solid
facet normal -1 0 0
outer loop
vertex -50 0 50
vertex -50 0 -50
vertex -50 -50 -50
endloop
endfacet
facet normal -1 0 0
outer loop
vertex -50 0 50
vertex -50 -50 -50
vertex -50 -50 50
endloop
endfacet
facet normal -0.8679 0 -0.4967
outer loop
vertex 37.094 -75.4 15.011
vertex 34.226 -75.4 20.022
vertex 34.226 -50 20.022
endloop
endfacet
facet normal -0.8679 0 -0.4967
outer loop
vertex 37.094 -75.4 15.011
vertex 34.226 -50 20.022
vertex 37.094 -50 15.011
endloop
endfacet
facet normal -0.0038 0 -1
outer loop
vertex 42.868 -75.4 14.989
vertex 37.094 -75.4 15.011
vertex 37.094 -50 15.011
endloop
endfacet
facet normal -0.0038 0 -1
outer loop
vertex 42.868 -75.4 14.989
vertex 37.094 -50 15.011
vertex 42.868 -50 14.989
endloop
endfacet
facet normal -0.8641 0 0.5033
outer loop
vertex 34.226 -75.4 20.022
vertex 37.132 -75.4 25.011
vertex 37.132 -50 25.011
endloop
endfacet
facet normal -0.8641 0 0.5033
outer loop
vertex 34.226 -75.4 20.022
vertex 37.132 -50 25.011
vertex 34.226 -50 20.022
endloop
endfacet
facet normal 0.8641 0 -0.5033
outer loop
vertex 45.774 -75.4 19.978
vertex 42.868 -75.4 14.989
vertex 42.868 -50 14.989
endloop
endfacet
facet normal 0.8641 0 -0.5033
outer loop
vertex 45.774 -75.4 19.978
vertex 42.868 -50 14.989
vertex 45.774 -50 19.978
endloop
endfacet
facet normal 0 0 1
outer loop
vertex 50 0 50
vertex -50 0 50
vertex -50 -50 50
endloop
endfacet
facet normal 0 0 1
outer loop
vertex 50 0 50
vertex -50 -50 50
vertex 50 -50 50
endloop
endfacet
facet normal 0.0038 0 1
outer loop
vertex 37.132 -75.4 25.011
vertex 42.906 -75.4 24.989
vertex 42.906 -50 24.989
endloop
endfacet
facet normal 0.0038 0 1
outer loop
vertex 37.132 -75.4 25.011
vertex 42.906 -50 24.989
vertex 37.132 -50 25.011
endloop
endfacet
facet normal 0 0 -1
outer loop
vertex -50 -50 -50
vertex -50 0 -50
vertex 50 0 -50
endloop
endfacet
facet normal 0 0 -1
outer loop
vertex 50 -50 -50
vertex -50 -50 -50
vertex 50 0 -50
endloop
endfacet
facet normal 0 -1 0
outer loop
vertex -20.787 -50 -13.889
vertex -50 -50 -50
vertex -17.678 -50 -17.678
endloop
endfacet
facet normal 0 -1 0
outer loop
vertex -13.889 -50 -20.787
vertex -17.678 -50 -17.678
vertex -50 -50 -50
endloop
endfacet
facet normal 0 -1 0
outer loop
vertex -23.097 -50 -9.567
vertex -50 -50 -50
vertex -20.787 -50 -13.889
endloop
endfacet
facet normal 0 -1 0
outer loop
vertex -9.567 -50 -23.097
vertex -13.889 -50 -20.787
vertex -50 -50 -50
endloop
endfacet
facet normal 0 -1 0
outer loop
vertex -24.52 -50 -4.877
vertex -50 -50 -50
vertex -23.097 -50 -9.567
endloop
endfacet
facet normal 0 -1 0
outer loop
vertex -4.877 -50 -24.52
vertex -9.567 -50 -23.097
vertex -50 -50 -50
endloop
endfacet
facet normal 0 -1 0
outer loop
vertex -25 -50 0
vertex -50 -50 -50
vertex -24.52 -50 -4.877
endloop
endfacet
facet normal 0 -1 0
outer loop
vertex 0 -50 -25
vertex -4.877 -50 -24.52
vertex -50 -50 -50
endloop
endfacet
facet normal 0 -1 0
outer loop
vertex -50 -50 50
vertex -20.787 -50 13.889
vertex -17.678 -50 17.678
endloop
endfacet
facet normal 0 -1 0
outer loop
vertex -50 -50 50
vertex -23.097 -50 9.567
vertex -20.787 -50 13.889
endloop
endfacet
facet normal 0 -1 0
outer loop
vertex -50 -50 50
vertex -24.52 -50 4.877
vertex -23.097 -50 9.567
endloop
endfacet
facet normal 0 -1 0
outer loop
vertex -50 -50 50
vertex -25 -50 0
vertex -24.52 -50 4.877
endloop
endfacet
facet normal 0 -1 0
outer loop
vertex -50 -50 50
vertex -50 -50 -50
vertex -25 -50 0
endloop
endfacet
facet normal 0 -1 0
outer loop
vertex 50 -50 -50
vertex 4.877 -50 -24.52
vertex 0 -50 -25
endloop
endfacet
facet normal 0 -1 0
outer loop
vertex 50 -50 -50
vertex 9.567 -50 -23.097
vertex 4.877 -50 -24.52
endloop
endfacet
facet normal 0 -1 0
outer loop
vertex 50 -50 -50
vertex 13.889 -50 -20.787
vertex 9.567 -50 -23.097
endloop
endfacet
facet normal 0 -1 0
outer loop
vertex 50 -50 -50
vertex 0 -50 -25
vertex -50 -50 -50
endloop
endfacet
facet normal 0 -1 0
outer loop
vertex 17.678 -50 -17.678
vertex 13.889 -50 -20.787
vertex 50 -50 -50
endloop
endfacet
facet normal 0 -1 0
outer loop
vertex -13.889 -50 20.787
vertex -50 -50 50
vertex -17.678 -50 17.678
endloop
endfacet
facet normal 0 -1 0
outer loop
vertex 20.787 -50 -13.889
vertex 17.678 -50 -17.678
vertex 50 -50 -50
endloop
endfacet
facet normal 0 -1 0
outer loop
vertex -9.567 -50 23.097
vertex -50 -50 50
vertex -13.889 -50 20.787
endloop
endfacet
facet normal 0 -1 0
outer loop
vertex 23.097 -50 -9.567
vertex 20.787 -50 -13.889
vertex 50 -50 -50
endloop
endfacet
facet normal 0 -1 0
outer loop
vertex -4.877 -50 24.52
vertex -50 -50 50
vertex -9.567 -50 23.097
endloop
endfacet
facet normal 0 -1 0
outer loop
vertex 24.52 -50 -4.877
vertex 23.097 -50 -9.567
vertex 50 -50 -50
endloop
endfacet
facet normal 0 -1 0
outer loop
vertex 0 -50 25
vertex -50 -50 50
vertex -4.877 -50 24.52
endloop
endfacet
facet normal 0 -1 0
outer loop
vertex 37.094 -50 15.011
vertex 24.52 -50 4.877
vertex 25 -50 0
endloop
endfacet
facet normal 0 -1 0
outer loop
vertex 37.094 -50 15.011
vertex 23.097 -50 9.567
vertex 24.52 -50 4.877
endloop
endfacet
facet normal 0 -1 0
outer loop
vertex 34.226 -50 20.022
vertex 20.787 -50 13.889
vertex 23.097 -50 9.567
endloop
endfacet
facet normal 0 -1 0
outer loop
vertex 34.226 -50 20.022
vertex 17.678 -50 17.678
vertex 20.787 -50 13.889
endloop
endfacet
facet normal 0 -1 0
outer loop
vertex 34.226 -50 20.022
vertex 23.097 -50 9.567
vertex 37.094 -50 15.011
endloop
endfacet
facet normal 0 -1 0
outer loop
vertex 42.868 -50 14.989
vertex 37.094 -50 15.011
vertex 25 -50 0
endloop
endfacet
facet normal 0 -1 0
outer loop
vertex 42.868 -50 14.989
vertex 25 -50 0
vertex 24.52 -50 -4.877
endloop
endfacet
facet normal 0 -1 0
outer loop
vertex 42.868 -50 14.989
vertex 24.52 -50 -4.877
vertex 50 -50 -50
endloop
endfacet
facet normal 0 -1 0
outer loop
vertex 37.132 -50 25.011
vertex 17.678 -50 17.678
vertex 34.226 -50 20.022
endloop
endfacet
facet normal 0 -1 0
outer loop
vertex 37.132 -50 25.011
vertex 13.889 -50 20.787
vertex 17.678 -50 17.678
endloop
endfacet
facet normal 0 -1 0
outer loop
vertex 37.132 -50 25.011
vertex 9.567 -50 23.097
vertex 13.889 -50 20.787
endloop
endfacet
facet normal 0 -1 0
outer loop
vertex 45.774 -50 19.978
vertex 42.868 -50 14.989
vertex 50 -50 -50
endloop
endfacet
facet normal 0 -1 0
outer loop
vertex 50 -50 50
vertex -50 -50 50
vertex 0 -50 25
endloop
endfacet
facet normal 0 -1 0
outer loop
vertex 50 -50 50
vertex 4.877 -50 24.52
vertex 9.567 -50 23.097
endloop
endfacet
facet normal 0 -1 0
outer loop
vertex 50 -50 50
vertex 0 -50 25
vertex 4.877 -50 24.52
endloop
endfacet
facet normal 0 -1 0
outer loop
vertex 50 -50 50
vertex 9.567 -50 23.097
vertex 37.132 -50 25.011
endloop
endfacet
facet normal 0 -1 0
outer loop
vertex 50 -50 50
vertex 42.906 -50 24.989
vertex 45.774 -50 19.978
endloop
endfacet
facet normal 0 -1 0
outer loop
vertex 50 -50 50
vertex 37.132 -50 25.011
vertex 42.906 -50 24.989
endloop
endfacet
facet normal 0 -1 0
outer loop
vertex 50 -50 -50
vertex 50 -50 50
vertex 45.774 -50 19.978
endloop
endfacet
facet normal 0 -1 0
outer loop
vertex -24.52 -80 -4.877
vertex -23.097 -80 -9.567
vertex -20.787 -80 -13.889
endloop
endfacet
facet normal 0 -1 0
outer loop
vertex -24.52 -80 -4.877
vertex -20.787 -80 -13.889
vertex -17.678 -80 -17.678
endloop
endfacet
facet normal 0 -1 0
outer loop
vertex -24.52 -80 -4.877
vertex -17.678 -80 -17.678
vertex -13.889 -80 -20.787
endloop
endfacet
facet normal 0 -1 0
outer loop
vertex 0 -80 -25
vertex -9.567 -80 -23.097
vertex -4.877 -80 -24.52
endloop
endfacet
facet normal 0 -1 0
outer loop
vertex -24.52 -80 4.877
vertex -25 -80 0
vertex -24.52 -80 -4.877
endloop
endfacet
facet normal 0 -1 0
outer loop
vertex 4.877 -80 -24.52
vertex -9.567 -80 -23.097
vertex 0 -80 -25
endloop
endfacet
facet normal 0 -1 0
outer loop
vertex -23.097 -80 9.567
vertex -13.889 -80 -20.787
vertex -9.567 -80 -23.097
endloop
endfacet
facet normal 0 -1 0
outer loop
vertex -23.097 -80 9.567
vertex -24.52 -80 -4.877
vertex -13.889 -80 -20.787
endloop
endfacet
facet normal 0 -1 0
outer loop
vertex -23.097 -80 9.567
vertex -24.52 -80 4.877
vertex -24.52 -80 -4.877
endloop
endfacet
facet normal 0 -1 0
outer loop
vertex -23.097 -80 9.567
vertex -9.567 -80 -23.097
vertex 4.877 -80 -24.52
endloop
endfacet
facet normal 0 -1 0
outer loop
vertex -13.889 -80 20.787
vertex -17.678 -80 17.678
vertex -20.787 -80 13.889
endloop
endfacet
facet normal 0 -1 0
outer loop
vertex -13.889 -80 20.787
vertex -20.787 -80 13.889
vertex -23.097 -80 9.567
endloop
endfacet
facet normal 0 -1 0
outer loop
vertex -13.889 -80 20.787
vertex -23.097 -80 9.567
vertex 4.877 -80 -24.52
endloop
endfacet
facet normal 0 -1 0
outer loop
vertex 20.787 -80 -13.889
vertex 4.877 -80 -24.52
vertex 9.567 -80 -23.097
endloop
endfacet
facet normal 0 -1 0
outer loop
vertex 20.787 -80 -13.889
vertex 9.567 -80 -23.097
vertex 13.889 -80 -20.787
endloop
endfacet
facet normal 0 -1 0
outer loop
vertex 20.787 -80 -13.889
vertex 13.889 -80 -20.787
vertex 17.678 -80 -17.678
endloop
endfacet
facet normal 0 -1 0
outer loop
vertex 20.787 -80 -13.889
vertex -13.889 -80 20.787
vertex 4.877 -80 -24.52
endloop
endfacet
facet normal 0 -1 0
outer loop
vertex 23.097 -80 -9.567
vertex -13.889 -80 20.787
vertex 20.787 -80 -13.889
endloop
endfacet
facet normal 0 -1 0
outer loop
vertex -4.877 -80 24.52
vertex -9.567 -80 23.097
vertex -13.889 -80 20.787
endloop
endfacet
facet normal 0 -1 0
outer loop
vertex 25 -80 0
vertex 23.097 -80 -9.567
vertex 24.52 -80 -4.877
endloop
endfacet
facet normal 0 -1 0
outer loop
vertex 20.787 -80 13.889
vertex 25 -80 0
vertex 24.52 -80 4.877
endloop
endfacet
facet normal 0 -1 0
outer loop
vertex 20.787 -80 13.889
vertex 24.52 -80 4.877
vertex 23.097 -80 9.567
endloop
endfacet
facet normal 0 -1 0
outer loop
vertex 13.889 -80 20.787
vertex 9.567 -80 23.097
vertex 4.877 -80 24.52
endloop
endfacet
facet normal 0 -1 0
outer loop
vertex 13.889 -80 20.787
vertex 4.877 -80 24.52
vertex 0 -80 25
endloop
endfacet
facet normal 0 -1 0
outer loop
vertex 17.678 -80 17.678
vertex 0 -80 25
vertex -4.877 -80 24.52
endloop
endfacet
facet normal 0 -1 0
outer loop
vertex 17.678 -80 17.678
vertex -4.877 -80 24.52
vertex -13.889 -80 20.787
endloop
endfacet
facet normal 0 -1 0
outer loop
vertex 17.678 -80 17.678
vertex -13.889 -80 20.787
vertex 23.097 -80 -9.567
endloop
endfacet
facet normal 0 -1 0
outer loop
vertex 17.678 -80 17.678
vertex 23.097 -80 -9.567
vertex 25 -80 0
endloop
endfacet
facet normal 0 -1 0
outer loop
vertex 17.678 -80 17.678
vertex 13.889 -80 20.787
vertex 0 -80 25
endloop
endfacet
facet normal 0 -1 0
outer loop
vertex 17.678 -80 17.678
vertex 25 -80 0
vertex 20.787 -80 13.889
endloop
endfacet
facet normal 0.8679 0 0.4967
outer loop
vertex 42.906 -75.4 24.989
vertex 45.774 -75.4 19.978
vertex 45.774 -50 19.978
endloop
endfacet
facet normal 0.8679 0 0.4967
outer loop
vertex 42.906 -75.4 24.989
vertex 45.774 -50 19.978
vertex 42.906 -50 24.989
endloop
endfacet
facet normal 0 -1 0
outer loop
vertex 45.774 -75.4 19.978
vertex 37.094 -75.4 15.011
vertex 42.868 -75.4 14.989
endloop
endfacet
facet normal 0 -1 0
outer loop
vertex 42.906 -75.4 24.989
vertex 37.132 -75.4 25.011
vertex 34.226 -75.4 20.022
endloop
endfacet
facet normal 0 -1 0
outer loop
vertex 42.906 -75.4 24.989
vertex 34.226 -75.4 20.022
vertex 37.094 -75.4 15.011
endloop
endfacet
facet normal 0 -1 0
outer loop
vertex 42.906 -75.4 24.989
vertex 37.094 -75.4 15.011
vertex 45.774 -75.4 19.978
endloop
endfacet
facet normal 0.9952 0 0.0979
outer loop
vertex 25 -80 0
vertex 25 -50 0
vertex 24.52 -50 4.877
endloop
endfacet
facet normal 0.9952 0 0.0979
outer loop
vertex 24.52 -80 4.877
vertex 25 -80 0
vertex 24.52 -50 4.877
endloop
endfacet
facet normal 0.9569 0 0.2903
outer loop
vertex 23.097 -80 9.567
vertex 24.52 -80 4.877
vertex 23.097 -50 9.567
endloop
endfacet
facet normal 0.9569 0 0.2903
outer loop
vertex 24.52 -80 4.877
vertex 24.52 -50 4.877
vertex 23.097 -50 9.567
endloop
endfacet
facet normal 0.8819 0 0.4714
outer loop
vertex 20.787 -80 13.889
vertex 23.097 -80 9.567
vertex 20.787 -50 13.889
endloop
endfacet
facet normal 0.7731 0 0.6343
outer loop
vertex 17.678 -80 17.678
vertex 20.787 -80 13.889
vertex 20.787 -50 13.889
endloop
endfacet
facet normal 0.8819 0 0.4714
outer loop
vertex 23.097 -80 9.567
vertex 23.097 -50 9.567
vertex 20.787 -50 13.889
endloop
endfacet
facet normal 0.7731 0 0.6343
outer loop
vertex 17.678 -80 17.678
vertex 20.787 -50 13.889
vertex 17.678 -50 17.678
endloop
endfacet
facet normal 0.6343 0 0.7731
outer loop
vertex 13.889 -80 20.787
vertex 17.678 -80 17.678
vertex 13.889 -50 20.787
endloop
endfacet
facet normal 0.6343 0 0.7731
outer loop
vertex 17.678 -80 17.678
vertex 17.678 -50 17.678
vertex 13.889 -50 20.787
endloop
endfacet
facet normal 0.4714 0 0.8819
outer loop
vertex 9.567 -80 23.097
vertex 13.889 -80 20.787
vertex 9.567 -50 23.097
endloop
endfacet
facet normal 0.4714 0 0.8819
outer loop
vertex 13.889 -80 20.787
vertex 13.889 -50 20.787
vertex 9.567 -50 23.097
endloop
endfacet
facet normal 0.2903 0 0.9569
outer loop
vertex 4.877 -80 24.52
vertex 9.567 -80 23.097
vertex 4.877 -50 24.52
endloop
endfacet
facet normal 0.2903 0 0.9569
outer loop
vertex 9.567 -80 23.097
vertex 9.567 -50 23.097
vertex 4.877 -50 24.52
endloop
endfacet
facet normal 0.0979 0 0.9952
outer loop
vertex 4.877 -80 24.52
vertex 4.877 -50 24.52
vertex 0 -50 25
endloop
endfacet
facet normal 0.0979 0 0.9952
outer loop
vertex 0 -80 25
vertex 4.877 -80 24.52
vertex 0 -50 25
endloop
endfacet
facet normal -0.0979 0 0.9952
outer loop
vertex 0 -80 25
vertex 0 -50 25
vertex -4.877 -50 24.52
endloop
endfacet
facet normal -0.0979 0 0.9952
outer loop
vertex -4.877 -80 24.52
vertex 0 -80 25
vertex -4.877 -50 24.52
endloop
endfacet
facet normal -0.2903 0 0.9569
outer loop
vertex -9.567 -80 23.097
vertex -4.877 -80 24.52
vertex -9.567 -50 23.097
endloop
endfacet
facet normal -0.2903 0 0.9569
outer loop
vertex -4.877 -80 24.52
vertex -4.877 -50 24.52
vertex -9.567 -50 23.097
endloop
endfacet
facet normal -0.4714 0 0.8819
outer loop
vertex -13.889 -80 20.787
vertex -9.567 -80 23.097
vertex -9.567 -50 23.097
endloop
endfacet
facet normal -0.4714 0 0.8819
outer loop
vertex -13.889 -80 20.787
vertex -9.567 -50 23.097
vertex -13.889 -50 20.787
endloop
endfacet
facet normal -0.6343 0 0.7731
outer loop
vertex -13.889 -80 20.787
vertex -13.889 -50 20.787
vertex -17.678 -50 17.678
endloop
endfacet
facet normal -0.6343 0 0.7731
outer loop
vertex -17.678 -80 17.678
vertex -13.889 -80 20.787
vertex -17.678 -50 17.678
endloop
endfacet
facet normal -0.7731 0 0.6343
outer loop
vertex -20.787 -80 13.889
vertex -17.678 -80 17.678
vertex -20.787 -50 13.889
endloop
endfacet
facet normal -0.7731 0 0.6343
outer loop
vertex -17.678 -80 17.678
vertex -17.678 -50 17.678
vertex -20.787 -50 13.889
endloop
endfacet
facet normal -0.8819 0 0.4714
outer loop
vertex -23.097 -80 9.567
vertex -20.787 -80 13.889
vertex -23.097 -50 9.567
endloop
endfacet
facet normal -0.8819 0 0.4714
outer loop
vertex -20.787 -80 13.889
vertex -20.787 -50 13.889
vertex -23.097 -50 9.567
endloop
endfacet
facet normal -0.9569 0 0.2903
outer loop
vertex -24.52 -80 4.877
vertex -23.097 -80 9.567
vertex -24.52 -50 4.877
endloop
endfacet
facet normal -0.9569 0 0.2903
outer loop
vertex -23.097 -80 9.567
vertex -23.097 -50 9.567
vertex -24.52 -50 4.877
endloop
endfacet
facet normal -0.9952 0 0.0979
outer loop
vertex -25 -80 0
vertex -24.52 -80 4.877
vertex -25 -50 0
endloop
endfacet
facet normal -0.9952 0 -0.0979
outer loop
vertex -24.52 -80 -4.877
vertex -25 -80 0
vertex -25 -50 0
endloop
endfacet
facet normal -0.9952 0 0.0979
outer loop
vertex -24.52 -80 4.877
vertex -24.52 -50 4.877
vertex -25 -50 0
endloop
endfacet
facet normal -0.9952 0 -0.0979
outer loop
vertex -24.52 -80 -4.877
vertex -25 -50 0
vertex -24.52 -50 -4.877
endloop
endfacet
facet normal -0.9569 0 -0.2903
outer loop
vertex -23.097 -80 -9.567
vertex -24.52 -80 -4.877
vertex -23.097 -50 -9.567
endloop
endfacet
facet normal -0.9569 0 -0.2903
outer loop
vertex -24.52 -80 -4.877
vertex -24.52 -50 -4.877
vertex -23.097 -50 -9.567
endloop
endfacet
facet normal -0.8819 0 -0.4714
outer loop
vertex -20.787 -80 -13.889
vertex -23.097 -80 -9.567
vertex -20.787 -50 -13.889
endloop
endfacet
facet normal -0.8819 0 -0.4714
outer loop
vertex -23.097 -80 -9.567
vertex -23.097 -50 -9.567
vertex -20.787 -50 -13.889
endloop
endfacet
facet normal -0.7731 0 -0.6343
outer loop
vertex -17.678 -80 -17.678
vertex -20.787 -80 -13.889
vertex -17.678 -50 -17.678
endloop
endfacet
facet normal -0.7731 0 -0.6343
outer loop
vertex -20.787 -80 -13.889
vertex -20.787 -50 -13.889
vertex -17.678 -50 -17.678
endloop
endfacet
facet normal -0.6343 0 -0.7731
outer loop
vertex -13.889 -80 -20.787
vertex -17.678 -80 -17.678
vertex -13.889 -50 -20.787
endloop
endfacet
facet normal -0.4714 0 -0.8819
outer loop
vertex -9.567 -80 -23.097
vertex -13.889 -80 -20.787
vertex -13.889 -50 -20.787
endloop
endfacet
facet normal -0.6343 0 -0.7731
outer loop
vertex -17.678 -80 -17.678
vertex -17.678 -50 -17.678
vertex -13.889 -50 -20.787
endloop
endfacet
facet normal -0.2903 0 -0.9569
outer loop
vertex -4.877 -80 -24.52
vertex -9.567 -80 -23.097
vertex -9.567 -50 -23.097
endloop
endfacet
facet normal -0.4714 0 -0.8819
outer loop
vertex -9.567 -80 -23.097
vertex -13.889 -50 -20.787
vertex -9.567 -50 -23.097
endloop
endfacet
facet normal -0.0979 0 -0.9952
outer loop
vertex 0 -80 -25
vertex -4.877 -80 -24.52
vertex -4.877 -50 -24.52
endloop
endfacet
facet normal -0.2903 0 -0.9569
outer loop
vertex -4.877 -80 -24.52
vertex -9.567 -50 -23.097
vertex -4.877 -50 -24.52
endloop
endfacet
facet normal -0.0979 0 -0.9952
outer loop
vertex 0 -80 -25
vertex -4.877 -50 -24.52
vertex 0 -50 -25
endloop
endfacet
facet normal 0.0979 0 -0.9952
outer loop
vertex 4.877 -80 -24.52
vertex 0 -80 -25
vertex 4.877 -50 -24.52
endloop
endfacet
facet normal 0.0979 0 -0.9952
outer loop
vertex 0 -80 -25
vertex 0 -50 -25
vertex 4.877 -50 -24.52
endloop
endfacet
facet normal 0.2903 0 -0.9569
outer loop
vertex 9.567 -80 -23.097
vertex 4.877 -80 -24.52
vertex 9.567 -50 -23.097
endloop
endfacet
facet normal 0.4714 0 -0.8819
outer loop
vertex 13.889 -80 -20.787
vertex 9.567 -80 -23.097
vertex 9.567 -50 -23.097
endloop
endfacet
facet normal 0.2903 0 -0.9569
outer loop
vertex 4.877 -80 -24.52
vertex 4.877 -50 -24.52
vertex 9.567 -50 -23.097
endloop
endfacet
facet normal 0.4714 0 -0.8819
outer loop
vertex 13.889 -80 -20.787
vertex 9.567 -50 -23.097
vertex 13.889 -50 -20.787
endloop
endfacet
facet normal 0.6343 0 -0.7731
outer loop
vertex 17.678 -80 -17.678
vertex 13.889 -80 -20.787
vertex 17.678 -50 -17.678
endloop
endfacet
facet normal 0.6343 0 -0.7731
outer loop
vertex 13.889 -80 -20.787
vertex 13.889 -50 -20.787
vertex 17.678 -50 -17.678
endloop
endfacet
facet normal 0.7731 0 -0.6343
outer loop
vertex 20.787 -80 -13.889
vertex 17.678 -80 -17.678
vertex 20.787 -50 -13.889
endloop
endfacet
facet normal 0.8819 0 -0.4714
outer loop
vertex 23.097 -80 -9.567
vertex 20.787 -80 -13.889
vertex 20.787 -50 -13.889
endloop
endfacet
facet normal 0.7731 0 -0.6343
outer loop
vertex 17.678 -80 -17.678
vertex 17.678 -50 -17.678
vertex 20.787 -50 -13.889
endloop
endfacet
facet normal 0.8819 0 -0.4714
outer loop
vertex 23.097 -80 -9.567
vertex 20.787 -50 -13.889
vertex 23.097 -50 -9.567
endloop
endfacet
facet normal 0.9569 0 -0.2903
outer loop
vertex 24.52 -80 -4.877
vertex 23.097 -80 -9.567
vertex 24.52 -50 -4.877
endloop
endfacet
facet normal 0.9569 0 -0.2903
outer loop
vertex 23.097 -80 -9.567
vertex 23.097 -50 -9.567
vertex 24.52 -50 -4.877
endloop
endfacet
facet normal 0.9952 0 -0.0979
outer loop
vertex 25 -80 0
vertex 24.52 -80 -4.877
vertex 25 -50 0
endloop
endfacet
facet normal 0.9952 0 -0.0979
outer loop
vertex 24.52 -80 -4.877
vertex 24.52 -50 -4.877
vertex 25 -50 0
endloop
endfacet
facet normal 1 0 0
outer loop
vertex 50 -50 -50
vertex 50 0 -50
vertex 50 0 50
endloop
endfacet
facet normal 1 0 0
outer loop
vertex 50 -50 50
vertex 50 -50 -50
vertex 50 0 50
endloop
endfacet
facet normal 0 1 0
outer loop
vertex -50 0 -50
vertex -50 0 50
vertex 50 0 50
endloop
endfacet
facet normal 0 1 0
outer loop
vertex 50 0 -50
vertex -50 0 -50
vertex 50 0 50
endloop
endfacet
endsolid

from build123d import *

# Parameters (mm, degrees)
F0_W     = 100
F0_H     = 100
F1_DEPTH = 50
F2_R     = 25
F3_DEPTH = 30
F5_DEPTH = 25.4


with BuildPart() as f1:
    # F0 (on Front) → F1 (new body)
    with BuildSketch(Plane.XZ):
        Rectangle(F0_W, F0_H)
    extrude(amount=F1_DEPTH)

    # F2 (on face) → F3 (join)
    with BuildSketch(Plane.XZ.offset(50)):
        Circle(F2_R)
    extrude(amount=F3_DEPTH)

    # F4 (on face) → F5 (join)
    with BuildSketch(Plane.XZ.offset(50)):
        Polygon((45.773503, 19.977803), (42.905975, 24.988901), (37.132472, 25.011099), (34.226497, 20.022197), (37.094025, 15.011099), (42.867528, 14.988901), align=None)
    extrude(amount=F5_DEPTH)


solid = f1.part
